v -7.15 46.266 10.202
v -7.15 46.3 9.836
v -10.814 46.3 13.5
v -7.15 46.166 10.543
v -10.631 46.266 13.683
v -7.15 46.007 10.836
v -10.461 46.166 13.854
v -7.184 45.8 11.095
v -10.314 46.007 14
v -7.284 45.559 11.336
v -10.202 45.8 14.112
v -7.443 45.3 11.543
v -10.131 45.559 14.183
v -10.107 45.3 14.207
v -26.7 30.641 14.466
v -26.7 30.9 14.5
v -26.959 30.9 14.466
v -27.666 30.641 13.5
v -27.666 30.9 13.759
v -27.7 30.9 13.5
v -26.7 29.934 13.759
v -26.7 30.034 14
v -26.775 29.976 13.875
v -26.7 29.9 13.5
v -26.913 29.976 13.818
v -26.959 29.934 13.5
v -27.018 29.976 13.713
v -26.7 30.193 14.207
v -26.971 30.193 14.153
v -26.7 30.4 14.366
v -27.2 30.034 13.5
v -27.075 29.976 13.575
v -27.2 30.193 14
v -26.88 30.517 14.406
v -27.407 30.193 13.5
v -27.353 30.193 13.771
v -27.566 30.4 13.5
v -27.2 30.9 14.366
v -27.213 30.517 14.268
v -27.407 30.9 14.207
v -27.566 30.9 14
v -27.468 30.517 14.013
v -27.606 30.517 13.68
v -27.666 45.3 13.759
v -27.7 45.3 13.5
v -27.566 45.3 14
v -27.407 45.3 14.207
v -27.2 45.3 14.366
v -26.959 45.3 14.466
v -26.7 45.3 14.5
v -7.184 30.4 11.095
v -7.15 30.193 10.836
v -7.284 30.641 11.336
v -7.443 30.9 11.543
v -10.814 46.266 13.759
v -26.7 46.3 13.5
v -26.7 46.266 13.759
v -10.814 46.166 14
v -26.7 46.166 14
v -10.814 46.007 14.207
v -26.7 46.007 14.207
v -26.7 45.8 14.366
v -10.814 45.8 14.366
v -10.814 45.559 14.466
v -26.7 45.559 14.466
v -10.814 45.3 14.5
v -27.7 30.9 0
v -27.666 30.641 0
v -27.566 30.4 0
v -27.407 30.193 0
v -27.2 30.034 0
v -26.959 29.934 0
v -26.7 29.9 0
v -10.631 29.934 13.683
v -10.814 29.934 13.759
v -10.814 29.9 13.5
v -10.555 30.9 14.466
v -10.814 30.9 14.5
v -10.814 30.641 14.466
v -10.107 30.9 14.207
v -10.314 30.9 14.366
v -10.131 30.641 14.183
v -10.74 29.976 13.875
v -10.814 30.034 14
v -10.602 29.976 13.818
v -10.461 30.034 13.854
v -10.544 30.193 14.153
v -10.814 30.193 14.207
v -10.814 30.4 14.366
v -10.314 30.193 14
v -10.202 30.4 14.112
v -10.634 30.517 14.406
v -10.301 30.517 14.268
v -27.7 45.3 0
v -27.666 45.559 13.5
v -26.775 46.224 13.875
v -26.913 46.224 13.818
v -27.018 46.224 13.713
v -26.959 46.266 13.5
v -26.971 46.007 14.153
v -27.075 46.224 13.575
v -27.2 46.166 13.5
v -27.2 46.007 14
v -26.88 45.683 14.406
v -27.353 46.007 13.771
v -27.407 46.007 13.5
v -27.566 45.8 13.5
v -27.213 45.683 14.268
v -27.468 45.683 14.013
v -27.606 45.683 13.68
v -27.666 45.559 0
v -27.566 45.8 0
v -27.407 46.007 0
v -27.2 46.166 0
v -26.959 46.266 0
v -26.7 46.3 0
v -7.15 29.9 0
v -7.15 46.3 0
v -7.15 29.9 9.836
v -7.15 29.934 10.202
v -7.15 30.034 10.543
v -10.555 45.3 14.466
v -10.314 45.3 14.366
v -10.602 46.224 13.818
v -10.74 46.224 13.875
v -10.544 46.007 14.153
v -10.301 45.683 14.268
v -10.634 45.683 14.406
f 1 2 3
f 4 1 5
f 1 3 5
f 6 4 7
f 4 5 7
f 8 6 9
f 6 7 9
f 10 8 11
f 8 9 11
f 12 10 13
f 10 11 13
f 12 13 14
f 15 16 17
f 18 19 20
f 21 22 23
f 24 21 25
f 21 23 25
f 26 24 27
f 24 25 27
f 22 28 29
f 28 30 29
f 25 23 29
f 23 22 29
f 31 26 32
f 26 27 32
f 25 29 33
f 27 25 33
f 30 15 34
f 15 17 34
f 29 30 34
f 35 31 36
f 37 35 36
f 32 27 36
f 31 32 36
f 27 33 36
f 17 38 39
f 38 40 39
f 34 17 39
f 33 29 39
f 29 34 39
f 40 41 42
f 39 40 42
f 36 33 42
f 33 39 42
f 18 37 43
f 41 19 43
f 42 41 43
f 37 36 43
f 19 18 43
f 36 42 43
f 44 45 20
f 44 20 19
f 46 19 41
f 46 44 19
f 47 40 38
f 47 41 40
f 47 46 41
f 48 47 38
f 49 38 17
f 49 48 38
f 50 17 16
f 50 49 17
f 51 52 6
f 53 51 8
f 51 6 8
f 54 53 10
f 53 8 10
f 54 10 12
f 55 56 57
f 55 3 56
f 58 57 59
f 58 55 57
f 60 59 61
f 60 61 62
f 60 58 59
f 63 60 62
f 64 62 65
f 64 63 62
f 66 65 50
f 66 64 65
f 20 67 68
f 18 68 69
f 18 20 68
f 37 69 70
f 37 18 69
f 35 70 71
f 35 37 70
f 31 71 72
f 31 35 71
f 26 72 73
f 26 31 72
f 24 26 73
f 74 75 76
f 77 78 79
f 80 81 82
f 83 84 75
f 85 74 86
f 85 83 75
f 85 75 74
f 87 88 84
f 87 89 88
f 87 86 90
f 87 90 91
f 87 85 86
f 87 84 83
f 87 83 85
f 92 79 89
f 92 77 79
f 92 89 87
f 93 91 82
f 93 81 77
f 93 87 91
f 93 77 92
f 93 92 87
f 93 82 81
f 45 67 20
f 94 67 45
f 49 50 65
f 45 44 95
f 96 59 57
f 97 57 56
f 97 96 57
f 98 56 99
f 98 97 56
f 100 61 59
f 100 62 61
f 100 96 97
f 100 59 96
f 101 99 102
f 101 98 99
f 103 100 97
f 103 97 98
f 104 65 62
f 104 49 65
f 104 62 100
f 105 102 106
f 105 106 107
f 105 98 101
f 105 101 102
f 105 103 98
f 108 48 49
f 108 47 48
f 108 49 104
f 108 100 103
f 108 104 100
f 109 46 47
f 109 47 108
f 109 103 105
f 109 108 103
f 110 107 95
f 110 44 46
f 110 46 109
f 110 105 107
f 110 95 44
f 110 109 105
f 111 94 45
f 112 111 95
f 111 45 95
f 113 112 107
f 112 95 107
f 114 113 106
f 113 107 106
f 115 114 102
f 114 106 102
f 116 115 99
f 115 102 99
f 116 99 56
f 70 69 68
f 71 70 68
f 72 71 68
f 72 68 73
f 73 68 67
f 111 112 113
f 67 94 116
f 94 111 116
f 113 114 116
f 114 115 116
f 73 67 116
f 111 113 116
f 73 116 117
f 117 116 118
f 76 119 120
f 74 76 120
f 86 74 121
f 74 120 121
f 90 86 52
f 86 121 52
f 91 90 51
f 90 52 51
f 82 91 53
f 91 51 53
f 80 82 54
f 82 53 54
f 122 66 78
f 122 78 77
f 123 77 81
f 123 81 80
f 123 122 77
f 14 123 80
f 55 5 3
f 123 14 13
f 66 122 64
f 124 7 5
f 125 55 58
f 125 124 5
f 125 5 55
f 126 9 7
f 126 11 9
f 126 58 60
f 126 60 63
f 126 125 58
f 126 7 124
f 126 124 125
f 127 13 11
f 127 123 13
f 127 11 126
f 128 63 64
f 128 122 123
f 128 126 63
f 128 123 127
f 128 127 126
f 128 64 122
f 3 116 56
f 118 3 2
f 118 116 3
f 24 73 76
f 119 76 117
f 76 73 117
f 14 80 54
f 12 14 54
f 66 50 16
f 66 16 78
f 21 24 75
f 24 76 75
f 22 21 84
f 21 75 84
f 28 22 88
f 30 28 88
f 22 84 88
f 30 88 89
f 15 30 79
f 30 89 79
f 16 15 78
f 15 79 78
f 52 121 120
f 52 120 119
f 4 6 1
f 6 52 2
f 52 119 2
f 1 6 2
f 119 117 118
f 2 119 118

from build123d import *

# Parameters (mm, degrees)
SKETCH049_W     = 20.55
SKETCH049_H     = 16.4
PAD017_DEPTH    = 14.5
SKETCH057_W     = 30
SKETCH057_H     = 20
POCKET032_DEPTH = 16.401
FILLET003_R     = 1


with BuildPart() as part:
    # Sketch049 → Pad017 (new body)
    with BuildSketch(Plane.XY):
        with Locations((-17.425, 38.1)):
            Rectangle(SKETCH049_W, SKETCH049_H)
    extrude(amount=PAD017_DEPTH)

    # Sketch057 (on Face3 of Pad017) → Pocket032 (cut, through all)
    with BuildSketch(Plane.XZ.offset(-29.9)):
        with Locations((-17, 8)):
            Rectangle(SKETCH057_W, SKETCH057_H)
        Polygon((-27.7, 14.5), (-10.4, 14.5), (-7.15, 11.25), (-7.15, 0), (-27.7, 0), align=None, mode=Mode.SUBTRACT)
    extrude(amount=-POCKET032_DEPTH, mode=Mode.SUBTRACT)

    # Fillet003
    fillet003_edges = [part.edges().sort_by_distance(p)[0] for p in [
        (-27.7, 38.1, 14.5),
        (-19.05, 46.3, 14.5),
        (-10.4, 38.1, 14.5),
        (-19.05, 29.9, 14.5),
        (-8.775, 29.9, 12.875),
        (-8.775, 46.3, 12.875),
        (-7.15, 38.1, 11.25),
        (-27.7, 29.9, 7.25),
        (-27.7, 46.3, 7.25),
    ]]
    fillet(fillet003_edges, radius=FILLET003_R)


solid = part.part
